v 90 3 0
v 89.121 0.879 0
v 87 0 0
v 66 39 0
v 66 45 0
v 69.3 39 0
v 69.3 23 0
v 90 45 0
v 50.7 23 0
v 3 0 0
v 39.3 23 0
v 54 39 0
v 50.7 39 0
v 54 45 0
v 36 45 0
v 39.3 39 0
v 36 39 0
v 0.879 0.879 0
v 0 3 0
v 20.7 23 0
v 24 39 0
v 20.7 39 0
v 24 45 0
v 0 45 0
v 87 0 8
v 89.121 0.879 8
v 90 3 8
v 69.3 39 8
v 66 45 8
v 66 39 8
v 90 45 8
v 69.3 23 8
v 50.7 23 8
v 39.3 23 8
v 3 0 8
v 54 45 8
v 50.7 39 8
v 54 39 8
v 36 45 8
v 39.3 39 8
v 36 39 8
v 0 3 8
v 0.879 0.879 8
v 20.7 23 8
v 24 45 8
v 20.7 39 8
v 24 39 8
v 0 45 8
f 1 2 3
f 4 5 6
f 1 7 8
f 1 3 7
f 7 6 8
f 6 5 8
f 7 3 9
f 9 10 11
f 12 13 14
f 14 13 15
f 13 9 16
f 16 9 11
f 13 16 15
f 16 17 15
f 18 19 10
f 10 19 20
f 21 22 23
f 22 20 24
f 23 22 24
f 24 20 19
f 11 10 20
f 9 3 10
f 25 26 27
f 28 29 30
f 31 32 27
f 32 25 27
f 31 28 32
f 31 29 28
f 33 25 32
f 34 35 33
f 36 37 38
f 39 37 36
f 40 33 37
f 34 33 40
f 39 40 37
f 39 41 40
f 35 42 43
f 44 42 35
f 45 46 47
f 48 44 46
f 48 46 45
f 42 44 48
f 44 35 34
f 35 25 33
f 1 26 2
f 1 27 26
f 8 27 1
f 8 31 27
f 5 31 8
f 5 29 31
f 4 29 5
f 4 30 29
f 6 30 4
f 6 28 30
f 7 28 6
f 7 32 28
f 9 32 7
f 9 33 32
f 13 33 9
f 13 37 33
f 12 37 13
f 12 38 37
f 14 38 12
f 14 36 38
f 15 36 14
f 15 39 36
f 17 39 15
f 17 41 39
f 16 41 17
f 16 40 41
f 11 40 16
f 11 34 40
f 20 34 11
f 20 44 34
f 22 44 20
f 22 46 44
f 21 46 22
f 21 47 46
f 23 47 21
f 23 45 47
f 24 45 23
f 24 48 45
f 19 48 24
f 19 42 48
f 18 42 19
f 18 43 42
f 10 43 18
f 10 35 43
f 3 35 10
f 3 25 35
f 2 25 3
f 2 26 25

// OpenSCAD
$fn = 32;

// ----------------------------------------------------------------------
// Window plate: 90 x 45 mm, 2 open windows
// ----------------------------------------------------------------------

// --- parameters (mm) ---
profile_height = 8;       // extrusion height
profile_points = 24;      // points of the closed outline

profile = [[0, 3], [0.879, 0.879], [3, 0], [87, 0], [89.121, 0.879], [90, 3], [90, 45], [66, 45], [66, 39], [69.3, 39], [69.3, 23], [50.7, 23], [50.7, 39], [54, 39], [54, 45], [36, 45], [36, 39], [39.3, 39], [39.3, 23], [20.7, 23], [20.7, 39], [24, 39], [24, 45], [0, 45]];  // single closed polygon, 24 points, counter clockwise

// --- the one profile operation ---
linear_extrude(height = profile_height) polygon(points = profile);
